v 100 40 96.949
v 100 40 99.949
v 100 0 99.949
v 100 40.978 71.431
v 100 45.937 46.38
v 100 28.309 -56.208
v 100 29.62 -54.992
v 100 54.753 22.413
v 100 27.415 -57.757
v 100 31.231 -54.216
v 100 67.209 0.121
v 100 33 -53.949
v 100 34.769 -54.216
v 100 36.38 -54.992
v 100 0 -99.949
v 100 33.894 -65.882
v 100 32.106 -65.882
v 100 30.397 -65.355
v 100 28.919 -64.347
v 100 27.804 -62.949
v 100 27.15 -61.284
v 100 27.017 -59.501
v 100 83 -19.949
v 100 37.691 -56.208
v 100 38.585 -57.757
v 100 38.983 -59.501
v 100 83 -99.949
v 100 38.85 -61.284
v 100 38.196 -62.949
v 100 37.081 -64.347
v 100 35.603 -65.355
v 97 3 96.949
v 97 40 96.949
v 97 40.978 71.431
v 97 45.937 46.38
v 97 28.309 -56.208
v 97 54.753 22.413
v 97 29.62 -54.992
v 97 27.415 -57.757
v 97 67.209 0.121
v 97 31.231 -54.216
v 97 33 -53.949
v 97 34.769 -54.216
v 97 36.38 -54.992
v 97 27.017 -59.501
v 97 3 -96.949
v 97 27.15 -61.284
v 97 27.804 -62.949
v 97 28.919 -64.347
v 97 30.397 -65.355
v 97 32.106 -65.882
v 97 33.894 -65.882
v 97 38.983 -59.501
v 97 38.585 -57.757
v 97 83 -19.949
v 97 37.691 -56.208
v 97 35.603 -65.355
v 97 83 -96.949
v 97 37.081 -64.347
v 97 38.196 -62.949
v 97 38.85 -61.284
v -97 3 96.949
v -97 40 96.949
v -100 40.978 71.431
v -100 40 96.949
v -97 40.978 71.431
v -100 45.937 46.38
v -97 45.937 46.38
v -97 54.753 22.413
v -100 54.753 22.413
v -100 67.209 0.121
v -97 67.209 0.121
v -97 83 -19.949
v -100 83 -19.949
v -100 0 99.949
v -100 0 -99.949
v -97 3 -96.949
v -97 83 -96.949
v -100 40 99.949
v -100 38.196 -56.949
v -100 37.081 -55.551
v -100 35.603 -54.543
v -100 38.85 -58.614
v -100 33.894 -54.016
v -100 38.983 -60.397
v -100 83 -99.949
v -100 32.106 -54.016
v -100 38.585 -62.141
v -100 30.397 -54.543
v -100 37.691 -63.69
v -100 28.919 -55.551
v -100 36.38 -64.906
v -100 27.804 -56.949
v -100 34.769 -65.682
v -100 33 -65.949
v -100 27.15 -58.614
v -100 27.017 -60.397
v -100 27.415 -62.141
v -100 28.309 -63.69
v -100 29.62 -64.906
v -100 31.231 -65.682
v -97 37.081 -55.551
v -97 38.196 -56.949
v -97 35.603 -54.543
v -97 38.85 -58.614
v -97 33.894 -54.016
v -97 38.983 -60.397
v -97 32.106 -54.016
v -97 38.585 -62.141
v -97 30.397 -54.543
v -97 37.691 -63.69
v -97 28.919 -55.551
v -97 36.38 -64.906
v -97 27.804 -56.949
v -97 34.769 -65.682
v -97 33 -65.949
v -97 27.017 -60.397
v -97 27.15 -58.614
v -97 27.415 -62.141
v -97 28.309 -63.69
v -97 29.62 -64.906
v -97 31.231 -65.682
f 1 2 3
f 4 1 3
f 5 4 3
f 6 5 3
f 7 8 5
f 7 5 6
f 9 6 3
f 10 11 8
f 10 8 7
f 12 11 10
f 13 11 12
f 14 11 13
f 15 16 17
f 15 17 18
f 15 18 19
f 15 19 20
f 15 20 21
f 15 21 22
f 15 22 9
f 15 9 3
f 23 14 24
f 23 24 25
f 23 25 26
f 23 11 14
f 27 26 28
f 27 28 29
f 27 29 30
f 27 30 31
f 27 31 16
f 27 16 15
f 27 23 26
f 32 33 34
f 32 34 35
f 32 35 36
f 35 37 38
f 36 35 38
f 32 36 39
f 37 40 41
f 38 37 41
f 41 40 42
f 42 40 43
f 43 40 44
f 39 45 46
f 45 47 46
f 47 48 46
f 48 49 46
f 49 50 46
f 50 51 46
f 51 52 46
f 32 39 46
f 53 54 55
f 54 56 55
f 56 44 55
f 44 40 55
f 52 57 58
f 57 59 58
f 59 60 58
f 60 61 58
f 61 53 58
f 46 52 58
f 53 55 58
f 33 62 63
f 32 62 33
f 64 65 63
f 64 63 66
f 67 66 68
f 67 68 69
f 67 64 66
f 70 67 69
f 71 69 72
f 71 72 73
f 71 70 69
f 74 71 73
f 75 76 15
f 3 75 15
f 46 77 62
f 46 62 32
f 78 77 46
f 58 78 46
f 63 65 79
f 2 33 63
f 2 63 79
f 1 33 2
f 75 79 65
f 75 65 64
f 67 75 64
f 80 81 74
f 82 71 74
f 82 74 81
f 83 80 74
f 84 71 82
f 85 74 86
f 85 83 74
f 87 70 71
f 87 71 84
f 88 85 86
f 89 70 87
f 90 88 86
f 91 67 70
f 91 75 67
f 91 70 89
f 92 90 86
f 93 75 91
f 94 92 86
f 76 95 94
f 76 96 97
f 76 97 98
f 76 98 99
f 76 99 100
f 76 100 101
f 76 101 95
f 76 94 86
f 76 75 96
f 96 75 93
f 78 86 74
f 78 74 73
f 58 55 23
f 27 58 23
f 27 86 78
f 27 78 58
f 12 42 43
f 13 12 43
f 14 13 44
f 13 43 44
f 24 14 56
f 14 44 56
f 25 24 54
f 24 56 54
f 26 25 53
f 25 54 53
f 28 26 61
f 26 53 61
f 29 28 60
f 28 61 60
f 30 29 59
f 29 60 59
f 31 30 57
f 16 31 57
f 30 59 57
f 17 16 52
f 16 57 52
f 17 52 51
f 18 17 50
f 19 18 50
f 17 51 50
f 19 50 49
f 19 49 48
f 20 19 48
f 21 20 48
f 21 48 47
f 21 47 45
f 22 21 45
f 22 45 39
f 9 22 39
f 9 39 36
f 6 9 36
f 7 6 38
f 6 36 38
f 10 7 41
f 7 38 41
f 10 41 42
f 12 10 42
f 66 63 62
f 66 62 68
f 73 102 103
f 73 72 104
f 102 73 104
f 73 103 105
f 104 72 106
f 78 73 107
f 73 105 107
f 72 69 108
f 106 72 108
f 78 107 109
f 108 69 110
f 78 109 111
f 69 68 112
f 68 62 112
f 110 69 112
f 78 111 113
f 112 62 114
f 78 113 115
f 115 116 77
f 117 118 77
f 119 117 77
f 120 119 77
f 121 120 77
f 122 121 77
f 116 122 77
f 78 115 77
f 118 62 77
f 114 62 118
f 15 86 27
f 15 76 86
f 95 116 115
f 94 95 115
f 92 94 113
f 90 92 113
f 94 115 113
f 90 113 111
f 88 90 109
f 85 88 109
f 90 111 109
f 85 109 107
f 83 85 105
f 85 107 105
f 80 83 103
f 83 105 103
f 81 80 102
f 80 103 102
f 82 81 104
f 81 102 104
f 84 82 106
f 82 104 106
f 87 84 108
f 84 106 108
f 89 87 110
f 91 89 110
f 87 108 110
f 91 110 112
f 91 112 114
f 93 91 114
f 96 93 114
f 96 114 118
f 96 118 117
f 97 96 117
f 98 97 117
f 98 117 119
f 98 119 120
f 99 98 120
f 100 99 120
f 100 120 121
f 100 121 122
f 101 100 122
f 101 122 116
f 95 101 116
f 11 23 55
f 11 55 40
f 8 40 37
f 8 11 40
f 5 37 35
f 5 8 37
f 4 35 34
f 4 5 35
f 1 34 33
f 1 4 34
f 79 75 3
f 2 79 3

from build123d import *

# Parameters (mm, degrees)
SKETCH3_W            = 200
SKETCH3_H            = 199.898
BOSS_EXTRUDE2_DEPTH  = 3
SKETCH9_W            = 3
SKETCH9_H            = 80
BOSS_EXTRUDE3_DEPTH  = 80
SKETCH10_W           = 3
SKETCH10_H           = 80
BOSS_EXTRUDE4_DEPTH  = 80
SKETCH11_W           = 200
SKETCH11_H           = 3
BOSS_EXTRUDE6_DEPTH  = 40
SKETCH23_R           = 6
CUT_EXTRUDE5_DEPTH   = 228.956
BOSS_EXTRUDE8_DEPTH  = 3
BOSS_EXTRUDE9_DEPTH  = 3
SKETCH30_R           = 6
CUT_EXTRUDE6_DEPTH   = 225.25
SKETCH32_W           = 200
SKETCH32_H           = 3
BOSS_EXTRUDE12_DEPTH = 83


with BuildPart() as part:
    # Sketch3 → Boss-Extrude2 (new body)
    with BuildSketch(Plane(origin=(0, 0, 0), x_dir=(1, 0, 0), z_dir=(0, 1, 0))):
        Rectangle(SKETCH3_W, SKETCH3_H)
    extrude(amount=BOSS_EXTRUDE2_DEPTH)

    # Sketch9 → Boss-Extrude3 (add)
    with BuildSketch(Plane(origin=(0, 3, 0), x_dir=(1, 0, 0), z_dir=(0, 1, 0))):
        with Locations((-98.5, 59.949)):
            Rectangle(SKETCH9_W, SKETCH9_H)
    extrude(amount=BOSS_EXTRUDE3_DEPTH)

    # Sketch10 → Boss-Extrude4 (add)
    with BuildSketch(Plane(origin=(0, 3, 0), x_dir=(1, 0, 0), z_dir=(0, 1, 0))):
        with Locations((98.5, 59.949)):
            Rectangle(SKETCH10_W, SKETCH10_H)
    extrude(amount=BOSS_EXTRUDE4_DEPTH)

    # Sketch11 → Boss-Extrude6 (add)
    with BuildSketch(Plane(origin=(0, 0, 0), x_dir=(1, 0, 0), z_dir=(0, 1, 0))):
        with Locations((0, -98.449)):
            Rectangle(SKETCH11_W, SKETCH11_H)
    extrude(amount=BOSS_EXTRUDE6_DEPTH)

    # Sketch23 → Cut-Extrude5 (cut)
    with BuildSketch(Plane.ZY.offset(100)):
        with Locations((-59.949, 33)):
            Circle(SKETCH23_R)
    extrude(amount=-CUT_EXTRUDE5_DEPTH, mode=Mode.SUBTRACT)

    # Sketch26 → Boss-Extrude8 (add)
    with BuildSketch(Plane.ZY.offset(100)):
        with BuildLine():
            Line((99.949, 0), (99.949, 40))
            Line((99.949, 40), (96.949, 40))
            ThreePointArc((96.949, 40), (34.223384101, 49.873771039), (-19.949, 83))
            Line((-19.949, 83), (-99.949, 83))
            Line((-99.949, 83), (-99.949, 0))
            Line((-99.949, 0), (99.949, 0))
        make_face()
    extrude(amount=-BOSS_EXTRUDE8_DEPTH)

    # Sketch29 → Boss-Extrude9 (add)
    with BuildSketch(Plane(origin=(100, 0, 0), x_dir=(0, 0, -1), z_dir=(1, 0, 0))):
        with BuildLine():
            ThreePointArc((19.949, 83), (-34.223384101, 49.873771039), (-96.949, 40))
            Line((-96.949, 40), (-96.949, 3))
            Line((-96.949, 3), (19.949, 3))
            Line((19.949, 3), (19.949, 83))
        make_face()
    extrude(amount=-BOSS_EXTRUDE9_DEPTH)

    # Sketch30 → Cut-Extrude6 (cut)
    with BuildSketch(Plane(origin=(100, 0, 0), x_dir=(0, 0, -1), z_dir=(1, 0, 0))):
        with Locations((59.949, 33)):
            Circle(SKETCH30_R)
    extrude(amount=-CUT_EXTRUDE6_DEPTH, mode=Mode.SUBTRACT)

    # Sketch32 → Boss-Extrude12 (add)
    with BuildSketch(Plane(origin=(0, 0, 0), x_dir=(1, 0, 0), z_dir=(0, 1, 0))):
        with Locations((0, 98.449)):
            Rectangle(SKETCH32_W, SKETCH32_H)
    extrude(amount=BOSS_EXTRUDE12_DEPTH)


solid = part.part
